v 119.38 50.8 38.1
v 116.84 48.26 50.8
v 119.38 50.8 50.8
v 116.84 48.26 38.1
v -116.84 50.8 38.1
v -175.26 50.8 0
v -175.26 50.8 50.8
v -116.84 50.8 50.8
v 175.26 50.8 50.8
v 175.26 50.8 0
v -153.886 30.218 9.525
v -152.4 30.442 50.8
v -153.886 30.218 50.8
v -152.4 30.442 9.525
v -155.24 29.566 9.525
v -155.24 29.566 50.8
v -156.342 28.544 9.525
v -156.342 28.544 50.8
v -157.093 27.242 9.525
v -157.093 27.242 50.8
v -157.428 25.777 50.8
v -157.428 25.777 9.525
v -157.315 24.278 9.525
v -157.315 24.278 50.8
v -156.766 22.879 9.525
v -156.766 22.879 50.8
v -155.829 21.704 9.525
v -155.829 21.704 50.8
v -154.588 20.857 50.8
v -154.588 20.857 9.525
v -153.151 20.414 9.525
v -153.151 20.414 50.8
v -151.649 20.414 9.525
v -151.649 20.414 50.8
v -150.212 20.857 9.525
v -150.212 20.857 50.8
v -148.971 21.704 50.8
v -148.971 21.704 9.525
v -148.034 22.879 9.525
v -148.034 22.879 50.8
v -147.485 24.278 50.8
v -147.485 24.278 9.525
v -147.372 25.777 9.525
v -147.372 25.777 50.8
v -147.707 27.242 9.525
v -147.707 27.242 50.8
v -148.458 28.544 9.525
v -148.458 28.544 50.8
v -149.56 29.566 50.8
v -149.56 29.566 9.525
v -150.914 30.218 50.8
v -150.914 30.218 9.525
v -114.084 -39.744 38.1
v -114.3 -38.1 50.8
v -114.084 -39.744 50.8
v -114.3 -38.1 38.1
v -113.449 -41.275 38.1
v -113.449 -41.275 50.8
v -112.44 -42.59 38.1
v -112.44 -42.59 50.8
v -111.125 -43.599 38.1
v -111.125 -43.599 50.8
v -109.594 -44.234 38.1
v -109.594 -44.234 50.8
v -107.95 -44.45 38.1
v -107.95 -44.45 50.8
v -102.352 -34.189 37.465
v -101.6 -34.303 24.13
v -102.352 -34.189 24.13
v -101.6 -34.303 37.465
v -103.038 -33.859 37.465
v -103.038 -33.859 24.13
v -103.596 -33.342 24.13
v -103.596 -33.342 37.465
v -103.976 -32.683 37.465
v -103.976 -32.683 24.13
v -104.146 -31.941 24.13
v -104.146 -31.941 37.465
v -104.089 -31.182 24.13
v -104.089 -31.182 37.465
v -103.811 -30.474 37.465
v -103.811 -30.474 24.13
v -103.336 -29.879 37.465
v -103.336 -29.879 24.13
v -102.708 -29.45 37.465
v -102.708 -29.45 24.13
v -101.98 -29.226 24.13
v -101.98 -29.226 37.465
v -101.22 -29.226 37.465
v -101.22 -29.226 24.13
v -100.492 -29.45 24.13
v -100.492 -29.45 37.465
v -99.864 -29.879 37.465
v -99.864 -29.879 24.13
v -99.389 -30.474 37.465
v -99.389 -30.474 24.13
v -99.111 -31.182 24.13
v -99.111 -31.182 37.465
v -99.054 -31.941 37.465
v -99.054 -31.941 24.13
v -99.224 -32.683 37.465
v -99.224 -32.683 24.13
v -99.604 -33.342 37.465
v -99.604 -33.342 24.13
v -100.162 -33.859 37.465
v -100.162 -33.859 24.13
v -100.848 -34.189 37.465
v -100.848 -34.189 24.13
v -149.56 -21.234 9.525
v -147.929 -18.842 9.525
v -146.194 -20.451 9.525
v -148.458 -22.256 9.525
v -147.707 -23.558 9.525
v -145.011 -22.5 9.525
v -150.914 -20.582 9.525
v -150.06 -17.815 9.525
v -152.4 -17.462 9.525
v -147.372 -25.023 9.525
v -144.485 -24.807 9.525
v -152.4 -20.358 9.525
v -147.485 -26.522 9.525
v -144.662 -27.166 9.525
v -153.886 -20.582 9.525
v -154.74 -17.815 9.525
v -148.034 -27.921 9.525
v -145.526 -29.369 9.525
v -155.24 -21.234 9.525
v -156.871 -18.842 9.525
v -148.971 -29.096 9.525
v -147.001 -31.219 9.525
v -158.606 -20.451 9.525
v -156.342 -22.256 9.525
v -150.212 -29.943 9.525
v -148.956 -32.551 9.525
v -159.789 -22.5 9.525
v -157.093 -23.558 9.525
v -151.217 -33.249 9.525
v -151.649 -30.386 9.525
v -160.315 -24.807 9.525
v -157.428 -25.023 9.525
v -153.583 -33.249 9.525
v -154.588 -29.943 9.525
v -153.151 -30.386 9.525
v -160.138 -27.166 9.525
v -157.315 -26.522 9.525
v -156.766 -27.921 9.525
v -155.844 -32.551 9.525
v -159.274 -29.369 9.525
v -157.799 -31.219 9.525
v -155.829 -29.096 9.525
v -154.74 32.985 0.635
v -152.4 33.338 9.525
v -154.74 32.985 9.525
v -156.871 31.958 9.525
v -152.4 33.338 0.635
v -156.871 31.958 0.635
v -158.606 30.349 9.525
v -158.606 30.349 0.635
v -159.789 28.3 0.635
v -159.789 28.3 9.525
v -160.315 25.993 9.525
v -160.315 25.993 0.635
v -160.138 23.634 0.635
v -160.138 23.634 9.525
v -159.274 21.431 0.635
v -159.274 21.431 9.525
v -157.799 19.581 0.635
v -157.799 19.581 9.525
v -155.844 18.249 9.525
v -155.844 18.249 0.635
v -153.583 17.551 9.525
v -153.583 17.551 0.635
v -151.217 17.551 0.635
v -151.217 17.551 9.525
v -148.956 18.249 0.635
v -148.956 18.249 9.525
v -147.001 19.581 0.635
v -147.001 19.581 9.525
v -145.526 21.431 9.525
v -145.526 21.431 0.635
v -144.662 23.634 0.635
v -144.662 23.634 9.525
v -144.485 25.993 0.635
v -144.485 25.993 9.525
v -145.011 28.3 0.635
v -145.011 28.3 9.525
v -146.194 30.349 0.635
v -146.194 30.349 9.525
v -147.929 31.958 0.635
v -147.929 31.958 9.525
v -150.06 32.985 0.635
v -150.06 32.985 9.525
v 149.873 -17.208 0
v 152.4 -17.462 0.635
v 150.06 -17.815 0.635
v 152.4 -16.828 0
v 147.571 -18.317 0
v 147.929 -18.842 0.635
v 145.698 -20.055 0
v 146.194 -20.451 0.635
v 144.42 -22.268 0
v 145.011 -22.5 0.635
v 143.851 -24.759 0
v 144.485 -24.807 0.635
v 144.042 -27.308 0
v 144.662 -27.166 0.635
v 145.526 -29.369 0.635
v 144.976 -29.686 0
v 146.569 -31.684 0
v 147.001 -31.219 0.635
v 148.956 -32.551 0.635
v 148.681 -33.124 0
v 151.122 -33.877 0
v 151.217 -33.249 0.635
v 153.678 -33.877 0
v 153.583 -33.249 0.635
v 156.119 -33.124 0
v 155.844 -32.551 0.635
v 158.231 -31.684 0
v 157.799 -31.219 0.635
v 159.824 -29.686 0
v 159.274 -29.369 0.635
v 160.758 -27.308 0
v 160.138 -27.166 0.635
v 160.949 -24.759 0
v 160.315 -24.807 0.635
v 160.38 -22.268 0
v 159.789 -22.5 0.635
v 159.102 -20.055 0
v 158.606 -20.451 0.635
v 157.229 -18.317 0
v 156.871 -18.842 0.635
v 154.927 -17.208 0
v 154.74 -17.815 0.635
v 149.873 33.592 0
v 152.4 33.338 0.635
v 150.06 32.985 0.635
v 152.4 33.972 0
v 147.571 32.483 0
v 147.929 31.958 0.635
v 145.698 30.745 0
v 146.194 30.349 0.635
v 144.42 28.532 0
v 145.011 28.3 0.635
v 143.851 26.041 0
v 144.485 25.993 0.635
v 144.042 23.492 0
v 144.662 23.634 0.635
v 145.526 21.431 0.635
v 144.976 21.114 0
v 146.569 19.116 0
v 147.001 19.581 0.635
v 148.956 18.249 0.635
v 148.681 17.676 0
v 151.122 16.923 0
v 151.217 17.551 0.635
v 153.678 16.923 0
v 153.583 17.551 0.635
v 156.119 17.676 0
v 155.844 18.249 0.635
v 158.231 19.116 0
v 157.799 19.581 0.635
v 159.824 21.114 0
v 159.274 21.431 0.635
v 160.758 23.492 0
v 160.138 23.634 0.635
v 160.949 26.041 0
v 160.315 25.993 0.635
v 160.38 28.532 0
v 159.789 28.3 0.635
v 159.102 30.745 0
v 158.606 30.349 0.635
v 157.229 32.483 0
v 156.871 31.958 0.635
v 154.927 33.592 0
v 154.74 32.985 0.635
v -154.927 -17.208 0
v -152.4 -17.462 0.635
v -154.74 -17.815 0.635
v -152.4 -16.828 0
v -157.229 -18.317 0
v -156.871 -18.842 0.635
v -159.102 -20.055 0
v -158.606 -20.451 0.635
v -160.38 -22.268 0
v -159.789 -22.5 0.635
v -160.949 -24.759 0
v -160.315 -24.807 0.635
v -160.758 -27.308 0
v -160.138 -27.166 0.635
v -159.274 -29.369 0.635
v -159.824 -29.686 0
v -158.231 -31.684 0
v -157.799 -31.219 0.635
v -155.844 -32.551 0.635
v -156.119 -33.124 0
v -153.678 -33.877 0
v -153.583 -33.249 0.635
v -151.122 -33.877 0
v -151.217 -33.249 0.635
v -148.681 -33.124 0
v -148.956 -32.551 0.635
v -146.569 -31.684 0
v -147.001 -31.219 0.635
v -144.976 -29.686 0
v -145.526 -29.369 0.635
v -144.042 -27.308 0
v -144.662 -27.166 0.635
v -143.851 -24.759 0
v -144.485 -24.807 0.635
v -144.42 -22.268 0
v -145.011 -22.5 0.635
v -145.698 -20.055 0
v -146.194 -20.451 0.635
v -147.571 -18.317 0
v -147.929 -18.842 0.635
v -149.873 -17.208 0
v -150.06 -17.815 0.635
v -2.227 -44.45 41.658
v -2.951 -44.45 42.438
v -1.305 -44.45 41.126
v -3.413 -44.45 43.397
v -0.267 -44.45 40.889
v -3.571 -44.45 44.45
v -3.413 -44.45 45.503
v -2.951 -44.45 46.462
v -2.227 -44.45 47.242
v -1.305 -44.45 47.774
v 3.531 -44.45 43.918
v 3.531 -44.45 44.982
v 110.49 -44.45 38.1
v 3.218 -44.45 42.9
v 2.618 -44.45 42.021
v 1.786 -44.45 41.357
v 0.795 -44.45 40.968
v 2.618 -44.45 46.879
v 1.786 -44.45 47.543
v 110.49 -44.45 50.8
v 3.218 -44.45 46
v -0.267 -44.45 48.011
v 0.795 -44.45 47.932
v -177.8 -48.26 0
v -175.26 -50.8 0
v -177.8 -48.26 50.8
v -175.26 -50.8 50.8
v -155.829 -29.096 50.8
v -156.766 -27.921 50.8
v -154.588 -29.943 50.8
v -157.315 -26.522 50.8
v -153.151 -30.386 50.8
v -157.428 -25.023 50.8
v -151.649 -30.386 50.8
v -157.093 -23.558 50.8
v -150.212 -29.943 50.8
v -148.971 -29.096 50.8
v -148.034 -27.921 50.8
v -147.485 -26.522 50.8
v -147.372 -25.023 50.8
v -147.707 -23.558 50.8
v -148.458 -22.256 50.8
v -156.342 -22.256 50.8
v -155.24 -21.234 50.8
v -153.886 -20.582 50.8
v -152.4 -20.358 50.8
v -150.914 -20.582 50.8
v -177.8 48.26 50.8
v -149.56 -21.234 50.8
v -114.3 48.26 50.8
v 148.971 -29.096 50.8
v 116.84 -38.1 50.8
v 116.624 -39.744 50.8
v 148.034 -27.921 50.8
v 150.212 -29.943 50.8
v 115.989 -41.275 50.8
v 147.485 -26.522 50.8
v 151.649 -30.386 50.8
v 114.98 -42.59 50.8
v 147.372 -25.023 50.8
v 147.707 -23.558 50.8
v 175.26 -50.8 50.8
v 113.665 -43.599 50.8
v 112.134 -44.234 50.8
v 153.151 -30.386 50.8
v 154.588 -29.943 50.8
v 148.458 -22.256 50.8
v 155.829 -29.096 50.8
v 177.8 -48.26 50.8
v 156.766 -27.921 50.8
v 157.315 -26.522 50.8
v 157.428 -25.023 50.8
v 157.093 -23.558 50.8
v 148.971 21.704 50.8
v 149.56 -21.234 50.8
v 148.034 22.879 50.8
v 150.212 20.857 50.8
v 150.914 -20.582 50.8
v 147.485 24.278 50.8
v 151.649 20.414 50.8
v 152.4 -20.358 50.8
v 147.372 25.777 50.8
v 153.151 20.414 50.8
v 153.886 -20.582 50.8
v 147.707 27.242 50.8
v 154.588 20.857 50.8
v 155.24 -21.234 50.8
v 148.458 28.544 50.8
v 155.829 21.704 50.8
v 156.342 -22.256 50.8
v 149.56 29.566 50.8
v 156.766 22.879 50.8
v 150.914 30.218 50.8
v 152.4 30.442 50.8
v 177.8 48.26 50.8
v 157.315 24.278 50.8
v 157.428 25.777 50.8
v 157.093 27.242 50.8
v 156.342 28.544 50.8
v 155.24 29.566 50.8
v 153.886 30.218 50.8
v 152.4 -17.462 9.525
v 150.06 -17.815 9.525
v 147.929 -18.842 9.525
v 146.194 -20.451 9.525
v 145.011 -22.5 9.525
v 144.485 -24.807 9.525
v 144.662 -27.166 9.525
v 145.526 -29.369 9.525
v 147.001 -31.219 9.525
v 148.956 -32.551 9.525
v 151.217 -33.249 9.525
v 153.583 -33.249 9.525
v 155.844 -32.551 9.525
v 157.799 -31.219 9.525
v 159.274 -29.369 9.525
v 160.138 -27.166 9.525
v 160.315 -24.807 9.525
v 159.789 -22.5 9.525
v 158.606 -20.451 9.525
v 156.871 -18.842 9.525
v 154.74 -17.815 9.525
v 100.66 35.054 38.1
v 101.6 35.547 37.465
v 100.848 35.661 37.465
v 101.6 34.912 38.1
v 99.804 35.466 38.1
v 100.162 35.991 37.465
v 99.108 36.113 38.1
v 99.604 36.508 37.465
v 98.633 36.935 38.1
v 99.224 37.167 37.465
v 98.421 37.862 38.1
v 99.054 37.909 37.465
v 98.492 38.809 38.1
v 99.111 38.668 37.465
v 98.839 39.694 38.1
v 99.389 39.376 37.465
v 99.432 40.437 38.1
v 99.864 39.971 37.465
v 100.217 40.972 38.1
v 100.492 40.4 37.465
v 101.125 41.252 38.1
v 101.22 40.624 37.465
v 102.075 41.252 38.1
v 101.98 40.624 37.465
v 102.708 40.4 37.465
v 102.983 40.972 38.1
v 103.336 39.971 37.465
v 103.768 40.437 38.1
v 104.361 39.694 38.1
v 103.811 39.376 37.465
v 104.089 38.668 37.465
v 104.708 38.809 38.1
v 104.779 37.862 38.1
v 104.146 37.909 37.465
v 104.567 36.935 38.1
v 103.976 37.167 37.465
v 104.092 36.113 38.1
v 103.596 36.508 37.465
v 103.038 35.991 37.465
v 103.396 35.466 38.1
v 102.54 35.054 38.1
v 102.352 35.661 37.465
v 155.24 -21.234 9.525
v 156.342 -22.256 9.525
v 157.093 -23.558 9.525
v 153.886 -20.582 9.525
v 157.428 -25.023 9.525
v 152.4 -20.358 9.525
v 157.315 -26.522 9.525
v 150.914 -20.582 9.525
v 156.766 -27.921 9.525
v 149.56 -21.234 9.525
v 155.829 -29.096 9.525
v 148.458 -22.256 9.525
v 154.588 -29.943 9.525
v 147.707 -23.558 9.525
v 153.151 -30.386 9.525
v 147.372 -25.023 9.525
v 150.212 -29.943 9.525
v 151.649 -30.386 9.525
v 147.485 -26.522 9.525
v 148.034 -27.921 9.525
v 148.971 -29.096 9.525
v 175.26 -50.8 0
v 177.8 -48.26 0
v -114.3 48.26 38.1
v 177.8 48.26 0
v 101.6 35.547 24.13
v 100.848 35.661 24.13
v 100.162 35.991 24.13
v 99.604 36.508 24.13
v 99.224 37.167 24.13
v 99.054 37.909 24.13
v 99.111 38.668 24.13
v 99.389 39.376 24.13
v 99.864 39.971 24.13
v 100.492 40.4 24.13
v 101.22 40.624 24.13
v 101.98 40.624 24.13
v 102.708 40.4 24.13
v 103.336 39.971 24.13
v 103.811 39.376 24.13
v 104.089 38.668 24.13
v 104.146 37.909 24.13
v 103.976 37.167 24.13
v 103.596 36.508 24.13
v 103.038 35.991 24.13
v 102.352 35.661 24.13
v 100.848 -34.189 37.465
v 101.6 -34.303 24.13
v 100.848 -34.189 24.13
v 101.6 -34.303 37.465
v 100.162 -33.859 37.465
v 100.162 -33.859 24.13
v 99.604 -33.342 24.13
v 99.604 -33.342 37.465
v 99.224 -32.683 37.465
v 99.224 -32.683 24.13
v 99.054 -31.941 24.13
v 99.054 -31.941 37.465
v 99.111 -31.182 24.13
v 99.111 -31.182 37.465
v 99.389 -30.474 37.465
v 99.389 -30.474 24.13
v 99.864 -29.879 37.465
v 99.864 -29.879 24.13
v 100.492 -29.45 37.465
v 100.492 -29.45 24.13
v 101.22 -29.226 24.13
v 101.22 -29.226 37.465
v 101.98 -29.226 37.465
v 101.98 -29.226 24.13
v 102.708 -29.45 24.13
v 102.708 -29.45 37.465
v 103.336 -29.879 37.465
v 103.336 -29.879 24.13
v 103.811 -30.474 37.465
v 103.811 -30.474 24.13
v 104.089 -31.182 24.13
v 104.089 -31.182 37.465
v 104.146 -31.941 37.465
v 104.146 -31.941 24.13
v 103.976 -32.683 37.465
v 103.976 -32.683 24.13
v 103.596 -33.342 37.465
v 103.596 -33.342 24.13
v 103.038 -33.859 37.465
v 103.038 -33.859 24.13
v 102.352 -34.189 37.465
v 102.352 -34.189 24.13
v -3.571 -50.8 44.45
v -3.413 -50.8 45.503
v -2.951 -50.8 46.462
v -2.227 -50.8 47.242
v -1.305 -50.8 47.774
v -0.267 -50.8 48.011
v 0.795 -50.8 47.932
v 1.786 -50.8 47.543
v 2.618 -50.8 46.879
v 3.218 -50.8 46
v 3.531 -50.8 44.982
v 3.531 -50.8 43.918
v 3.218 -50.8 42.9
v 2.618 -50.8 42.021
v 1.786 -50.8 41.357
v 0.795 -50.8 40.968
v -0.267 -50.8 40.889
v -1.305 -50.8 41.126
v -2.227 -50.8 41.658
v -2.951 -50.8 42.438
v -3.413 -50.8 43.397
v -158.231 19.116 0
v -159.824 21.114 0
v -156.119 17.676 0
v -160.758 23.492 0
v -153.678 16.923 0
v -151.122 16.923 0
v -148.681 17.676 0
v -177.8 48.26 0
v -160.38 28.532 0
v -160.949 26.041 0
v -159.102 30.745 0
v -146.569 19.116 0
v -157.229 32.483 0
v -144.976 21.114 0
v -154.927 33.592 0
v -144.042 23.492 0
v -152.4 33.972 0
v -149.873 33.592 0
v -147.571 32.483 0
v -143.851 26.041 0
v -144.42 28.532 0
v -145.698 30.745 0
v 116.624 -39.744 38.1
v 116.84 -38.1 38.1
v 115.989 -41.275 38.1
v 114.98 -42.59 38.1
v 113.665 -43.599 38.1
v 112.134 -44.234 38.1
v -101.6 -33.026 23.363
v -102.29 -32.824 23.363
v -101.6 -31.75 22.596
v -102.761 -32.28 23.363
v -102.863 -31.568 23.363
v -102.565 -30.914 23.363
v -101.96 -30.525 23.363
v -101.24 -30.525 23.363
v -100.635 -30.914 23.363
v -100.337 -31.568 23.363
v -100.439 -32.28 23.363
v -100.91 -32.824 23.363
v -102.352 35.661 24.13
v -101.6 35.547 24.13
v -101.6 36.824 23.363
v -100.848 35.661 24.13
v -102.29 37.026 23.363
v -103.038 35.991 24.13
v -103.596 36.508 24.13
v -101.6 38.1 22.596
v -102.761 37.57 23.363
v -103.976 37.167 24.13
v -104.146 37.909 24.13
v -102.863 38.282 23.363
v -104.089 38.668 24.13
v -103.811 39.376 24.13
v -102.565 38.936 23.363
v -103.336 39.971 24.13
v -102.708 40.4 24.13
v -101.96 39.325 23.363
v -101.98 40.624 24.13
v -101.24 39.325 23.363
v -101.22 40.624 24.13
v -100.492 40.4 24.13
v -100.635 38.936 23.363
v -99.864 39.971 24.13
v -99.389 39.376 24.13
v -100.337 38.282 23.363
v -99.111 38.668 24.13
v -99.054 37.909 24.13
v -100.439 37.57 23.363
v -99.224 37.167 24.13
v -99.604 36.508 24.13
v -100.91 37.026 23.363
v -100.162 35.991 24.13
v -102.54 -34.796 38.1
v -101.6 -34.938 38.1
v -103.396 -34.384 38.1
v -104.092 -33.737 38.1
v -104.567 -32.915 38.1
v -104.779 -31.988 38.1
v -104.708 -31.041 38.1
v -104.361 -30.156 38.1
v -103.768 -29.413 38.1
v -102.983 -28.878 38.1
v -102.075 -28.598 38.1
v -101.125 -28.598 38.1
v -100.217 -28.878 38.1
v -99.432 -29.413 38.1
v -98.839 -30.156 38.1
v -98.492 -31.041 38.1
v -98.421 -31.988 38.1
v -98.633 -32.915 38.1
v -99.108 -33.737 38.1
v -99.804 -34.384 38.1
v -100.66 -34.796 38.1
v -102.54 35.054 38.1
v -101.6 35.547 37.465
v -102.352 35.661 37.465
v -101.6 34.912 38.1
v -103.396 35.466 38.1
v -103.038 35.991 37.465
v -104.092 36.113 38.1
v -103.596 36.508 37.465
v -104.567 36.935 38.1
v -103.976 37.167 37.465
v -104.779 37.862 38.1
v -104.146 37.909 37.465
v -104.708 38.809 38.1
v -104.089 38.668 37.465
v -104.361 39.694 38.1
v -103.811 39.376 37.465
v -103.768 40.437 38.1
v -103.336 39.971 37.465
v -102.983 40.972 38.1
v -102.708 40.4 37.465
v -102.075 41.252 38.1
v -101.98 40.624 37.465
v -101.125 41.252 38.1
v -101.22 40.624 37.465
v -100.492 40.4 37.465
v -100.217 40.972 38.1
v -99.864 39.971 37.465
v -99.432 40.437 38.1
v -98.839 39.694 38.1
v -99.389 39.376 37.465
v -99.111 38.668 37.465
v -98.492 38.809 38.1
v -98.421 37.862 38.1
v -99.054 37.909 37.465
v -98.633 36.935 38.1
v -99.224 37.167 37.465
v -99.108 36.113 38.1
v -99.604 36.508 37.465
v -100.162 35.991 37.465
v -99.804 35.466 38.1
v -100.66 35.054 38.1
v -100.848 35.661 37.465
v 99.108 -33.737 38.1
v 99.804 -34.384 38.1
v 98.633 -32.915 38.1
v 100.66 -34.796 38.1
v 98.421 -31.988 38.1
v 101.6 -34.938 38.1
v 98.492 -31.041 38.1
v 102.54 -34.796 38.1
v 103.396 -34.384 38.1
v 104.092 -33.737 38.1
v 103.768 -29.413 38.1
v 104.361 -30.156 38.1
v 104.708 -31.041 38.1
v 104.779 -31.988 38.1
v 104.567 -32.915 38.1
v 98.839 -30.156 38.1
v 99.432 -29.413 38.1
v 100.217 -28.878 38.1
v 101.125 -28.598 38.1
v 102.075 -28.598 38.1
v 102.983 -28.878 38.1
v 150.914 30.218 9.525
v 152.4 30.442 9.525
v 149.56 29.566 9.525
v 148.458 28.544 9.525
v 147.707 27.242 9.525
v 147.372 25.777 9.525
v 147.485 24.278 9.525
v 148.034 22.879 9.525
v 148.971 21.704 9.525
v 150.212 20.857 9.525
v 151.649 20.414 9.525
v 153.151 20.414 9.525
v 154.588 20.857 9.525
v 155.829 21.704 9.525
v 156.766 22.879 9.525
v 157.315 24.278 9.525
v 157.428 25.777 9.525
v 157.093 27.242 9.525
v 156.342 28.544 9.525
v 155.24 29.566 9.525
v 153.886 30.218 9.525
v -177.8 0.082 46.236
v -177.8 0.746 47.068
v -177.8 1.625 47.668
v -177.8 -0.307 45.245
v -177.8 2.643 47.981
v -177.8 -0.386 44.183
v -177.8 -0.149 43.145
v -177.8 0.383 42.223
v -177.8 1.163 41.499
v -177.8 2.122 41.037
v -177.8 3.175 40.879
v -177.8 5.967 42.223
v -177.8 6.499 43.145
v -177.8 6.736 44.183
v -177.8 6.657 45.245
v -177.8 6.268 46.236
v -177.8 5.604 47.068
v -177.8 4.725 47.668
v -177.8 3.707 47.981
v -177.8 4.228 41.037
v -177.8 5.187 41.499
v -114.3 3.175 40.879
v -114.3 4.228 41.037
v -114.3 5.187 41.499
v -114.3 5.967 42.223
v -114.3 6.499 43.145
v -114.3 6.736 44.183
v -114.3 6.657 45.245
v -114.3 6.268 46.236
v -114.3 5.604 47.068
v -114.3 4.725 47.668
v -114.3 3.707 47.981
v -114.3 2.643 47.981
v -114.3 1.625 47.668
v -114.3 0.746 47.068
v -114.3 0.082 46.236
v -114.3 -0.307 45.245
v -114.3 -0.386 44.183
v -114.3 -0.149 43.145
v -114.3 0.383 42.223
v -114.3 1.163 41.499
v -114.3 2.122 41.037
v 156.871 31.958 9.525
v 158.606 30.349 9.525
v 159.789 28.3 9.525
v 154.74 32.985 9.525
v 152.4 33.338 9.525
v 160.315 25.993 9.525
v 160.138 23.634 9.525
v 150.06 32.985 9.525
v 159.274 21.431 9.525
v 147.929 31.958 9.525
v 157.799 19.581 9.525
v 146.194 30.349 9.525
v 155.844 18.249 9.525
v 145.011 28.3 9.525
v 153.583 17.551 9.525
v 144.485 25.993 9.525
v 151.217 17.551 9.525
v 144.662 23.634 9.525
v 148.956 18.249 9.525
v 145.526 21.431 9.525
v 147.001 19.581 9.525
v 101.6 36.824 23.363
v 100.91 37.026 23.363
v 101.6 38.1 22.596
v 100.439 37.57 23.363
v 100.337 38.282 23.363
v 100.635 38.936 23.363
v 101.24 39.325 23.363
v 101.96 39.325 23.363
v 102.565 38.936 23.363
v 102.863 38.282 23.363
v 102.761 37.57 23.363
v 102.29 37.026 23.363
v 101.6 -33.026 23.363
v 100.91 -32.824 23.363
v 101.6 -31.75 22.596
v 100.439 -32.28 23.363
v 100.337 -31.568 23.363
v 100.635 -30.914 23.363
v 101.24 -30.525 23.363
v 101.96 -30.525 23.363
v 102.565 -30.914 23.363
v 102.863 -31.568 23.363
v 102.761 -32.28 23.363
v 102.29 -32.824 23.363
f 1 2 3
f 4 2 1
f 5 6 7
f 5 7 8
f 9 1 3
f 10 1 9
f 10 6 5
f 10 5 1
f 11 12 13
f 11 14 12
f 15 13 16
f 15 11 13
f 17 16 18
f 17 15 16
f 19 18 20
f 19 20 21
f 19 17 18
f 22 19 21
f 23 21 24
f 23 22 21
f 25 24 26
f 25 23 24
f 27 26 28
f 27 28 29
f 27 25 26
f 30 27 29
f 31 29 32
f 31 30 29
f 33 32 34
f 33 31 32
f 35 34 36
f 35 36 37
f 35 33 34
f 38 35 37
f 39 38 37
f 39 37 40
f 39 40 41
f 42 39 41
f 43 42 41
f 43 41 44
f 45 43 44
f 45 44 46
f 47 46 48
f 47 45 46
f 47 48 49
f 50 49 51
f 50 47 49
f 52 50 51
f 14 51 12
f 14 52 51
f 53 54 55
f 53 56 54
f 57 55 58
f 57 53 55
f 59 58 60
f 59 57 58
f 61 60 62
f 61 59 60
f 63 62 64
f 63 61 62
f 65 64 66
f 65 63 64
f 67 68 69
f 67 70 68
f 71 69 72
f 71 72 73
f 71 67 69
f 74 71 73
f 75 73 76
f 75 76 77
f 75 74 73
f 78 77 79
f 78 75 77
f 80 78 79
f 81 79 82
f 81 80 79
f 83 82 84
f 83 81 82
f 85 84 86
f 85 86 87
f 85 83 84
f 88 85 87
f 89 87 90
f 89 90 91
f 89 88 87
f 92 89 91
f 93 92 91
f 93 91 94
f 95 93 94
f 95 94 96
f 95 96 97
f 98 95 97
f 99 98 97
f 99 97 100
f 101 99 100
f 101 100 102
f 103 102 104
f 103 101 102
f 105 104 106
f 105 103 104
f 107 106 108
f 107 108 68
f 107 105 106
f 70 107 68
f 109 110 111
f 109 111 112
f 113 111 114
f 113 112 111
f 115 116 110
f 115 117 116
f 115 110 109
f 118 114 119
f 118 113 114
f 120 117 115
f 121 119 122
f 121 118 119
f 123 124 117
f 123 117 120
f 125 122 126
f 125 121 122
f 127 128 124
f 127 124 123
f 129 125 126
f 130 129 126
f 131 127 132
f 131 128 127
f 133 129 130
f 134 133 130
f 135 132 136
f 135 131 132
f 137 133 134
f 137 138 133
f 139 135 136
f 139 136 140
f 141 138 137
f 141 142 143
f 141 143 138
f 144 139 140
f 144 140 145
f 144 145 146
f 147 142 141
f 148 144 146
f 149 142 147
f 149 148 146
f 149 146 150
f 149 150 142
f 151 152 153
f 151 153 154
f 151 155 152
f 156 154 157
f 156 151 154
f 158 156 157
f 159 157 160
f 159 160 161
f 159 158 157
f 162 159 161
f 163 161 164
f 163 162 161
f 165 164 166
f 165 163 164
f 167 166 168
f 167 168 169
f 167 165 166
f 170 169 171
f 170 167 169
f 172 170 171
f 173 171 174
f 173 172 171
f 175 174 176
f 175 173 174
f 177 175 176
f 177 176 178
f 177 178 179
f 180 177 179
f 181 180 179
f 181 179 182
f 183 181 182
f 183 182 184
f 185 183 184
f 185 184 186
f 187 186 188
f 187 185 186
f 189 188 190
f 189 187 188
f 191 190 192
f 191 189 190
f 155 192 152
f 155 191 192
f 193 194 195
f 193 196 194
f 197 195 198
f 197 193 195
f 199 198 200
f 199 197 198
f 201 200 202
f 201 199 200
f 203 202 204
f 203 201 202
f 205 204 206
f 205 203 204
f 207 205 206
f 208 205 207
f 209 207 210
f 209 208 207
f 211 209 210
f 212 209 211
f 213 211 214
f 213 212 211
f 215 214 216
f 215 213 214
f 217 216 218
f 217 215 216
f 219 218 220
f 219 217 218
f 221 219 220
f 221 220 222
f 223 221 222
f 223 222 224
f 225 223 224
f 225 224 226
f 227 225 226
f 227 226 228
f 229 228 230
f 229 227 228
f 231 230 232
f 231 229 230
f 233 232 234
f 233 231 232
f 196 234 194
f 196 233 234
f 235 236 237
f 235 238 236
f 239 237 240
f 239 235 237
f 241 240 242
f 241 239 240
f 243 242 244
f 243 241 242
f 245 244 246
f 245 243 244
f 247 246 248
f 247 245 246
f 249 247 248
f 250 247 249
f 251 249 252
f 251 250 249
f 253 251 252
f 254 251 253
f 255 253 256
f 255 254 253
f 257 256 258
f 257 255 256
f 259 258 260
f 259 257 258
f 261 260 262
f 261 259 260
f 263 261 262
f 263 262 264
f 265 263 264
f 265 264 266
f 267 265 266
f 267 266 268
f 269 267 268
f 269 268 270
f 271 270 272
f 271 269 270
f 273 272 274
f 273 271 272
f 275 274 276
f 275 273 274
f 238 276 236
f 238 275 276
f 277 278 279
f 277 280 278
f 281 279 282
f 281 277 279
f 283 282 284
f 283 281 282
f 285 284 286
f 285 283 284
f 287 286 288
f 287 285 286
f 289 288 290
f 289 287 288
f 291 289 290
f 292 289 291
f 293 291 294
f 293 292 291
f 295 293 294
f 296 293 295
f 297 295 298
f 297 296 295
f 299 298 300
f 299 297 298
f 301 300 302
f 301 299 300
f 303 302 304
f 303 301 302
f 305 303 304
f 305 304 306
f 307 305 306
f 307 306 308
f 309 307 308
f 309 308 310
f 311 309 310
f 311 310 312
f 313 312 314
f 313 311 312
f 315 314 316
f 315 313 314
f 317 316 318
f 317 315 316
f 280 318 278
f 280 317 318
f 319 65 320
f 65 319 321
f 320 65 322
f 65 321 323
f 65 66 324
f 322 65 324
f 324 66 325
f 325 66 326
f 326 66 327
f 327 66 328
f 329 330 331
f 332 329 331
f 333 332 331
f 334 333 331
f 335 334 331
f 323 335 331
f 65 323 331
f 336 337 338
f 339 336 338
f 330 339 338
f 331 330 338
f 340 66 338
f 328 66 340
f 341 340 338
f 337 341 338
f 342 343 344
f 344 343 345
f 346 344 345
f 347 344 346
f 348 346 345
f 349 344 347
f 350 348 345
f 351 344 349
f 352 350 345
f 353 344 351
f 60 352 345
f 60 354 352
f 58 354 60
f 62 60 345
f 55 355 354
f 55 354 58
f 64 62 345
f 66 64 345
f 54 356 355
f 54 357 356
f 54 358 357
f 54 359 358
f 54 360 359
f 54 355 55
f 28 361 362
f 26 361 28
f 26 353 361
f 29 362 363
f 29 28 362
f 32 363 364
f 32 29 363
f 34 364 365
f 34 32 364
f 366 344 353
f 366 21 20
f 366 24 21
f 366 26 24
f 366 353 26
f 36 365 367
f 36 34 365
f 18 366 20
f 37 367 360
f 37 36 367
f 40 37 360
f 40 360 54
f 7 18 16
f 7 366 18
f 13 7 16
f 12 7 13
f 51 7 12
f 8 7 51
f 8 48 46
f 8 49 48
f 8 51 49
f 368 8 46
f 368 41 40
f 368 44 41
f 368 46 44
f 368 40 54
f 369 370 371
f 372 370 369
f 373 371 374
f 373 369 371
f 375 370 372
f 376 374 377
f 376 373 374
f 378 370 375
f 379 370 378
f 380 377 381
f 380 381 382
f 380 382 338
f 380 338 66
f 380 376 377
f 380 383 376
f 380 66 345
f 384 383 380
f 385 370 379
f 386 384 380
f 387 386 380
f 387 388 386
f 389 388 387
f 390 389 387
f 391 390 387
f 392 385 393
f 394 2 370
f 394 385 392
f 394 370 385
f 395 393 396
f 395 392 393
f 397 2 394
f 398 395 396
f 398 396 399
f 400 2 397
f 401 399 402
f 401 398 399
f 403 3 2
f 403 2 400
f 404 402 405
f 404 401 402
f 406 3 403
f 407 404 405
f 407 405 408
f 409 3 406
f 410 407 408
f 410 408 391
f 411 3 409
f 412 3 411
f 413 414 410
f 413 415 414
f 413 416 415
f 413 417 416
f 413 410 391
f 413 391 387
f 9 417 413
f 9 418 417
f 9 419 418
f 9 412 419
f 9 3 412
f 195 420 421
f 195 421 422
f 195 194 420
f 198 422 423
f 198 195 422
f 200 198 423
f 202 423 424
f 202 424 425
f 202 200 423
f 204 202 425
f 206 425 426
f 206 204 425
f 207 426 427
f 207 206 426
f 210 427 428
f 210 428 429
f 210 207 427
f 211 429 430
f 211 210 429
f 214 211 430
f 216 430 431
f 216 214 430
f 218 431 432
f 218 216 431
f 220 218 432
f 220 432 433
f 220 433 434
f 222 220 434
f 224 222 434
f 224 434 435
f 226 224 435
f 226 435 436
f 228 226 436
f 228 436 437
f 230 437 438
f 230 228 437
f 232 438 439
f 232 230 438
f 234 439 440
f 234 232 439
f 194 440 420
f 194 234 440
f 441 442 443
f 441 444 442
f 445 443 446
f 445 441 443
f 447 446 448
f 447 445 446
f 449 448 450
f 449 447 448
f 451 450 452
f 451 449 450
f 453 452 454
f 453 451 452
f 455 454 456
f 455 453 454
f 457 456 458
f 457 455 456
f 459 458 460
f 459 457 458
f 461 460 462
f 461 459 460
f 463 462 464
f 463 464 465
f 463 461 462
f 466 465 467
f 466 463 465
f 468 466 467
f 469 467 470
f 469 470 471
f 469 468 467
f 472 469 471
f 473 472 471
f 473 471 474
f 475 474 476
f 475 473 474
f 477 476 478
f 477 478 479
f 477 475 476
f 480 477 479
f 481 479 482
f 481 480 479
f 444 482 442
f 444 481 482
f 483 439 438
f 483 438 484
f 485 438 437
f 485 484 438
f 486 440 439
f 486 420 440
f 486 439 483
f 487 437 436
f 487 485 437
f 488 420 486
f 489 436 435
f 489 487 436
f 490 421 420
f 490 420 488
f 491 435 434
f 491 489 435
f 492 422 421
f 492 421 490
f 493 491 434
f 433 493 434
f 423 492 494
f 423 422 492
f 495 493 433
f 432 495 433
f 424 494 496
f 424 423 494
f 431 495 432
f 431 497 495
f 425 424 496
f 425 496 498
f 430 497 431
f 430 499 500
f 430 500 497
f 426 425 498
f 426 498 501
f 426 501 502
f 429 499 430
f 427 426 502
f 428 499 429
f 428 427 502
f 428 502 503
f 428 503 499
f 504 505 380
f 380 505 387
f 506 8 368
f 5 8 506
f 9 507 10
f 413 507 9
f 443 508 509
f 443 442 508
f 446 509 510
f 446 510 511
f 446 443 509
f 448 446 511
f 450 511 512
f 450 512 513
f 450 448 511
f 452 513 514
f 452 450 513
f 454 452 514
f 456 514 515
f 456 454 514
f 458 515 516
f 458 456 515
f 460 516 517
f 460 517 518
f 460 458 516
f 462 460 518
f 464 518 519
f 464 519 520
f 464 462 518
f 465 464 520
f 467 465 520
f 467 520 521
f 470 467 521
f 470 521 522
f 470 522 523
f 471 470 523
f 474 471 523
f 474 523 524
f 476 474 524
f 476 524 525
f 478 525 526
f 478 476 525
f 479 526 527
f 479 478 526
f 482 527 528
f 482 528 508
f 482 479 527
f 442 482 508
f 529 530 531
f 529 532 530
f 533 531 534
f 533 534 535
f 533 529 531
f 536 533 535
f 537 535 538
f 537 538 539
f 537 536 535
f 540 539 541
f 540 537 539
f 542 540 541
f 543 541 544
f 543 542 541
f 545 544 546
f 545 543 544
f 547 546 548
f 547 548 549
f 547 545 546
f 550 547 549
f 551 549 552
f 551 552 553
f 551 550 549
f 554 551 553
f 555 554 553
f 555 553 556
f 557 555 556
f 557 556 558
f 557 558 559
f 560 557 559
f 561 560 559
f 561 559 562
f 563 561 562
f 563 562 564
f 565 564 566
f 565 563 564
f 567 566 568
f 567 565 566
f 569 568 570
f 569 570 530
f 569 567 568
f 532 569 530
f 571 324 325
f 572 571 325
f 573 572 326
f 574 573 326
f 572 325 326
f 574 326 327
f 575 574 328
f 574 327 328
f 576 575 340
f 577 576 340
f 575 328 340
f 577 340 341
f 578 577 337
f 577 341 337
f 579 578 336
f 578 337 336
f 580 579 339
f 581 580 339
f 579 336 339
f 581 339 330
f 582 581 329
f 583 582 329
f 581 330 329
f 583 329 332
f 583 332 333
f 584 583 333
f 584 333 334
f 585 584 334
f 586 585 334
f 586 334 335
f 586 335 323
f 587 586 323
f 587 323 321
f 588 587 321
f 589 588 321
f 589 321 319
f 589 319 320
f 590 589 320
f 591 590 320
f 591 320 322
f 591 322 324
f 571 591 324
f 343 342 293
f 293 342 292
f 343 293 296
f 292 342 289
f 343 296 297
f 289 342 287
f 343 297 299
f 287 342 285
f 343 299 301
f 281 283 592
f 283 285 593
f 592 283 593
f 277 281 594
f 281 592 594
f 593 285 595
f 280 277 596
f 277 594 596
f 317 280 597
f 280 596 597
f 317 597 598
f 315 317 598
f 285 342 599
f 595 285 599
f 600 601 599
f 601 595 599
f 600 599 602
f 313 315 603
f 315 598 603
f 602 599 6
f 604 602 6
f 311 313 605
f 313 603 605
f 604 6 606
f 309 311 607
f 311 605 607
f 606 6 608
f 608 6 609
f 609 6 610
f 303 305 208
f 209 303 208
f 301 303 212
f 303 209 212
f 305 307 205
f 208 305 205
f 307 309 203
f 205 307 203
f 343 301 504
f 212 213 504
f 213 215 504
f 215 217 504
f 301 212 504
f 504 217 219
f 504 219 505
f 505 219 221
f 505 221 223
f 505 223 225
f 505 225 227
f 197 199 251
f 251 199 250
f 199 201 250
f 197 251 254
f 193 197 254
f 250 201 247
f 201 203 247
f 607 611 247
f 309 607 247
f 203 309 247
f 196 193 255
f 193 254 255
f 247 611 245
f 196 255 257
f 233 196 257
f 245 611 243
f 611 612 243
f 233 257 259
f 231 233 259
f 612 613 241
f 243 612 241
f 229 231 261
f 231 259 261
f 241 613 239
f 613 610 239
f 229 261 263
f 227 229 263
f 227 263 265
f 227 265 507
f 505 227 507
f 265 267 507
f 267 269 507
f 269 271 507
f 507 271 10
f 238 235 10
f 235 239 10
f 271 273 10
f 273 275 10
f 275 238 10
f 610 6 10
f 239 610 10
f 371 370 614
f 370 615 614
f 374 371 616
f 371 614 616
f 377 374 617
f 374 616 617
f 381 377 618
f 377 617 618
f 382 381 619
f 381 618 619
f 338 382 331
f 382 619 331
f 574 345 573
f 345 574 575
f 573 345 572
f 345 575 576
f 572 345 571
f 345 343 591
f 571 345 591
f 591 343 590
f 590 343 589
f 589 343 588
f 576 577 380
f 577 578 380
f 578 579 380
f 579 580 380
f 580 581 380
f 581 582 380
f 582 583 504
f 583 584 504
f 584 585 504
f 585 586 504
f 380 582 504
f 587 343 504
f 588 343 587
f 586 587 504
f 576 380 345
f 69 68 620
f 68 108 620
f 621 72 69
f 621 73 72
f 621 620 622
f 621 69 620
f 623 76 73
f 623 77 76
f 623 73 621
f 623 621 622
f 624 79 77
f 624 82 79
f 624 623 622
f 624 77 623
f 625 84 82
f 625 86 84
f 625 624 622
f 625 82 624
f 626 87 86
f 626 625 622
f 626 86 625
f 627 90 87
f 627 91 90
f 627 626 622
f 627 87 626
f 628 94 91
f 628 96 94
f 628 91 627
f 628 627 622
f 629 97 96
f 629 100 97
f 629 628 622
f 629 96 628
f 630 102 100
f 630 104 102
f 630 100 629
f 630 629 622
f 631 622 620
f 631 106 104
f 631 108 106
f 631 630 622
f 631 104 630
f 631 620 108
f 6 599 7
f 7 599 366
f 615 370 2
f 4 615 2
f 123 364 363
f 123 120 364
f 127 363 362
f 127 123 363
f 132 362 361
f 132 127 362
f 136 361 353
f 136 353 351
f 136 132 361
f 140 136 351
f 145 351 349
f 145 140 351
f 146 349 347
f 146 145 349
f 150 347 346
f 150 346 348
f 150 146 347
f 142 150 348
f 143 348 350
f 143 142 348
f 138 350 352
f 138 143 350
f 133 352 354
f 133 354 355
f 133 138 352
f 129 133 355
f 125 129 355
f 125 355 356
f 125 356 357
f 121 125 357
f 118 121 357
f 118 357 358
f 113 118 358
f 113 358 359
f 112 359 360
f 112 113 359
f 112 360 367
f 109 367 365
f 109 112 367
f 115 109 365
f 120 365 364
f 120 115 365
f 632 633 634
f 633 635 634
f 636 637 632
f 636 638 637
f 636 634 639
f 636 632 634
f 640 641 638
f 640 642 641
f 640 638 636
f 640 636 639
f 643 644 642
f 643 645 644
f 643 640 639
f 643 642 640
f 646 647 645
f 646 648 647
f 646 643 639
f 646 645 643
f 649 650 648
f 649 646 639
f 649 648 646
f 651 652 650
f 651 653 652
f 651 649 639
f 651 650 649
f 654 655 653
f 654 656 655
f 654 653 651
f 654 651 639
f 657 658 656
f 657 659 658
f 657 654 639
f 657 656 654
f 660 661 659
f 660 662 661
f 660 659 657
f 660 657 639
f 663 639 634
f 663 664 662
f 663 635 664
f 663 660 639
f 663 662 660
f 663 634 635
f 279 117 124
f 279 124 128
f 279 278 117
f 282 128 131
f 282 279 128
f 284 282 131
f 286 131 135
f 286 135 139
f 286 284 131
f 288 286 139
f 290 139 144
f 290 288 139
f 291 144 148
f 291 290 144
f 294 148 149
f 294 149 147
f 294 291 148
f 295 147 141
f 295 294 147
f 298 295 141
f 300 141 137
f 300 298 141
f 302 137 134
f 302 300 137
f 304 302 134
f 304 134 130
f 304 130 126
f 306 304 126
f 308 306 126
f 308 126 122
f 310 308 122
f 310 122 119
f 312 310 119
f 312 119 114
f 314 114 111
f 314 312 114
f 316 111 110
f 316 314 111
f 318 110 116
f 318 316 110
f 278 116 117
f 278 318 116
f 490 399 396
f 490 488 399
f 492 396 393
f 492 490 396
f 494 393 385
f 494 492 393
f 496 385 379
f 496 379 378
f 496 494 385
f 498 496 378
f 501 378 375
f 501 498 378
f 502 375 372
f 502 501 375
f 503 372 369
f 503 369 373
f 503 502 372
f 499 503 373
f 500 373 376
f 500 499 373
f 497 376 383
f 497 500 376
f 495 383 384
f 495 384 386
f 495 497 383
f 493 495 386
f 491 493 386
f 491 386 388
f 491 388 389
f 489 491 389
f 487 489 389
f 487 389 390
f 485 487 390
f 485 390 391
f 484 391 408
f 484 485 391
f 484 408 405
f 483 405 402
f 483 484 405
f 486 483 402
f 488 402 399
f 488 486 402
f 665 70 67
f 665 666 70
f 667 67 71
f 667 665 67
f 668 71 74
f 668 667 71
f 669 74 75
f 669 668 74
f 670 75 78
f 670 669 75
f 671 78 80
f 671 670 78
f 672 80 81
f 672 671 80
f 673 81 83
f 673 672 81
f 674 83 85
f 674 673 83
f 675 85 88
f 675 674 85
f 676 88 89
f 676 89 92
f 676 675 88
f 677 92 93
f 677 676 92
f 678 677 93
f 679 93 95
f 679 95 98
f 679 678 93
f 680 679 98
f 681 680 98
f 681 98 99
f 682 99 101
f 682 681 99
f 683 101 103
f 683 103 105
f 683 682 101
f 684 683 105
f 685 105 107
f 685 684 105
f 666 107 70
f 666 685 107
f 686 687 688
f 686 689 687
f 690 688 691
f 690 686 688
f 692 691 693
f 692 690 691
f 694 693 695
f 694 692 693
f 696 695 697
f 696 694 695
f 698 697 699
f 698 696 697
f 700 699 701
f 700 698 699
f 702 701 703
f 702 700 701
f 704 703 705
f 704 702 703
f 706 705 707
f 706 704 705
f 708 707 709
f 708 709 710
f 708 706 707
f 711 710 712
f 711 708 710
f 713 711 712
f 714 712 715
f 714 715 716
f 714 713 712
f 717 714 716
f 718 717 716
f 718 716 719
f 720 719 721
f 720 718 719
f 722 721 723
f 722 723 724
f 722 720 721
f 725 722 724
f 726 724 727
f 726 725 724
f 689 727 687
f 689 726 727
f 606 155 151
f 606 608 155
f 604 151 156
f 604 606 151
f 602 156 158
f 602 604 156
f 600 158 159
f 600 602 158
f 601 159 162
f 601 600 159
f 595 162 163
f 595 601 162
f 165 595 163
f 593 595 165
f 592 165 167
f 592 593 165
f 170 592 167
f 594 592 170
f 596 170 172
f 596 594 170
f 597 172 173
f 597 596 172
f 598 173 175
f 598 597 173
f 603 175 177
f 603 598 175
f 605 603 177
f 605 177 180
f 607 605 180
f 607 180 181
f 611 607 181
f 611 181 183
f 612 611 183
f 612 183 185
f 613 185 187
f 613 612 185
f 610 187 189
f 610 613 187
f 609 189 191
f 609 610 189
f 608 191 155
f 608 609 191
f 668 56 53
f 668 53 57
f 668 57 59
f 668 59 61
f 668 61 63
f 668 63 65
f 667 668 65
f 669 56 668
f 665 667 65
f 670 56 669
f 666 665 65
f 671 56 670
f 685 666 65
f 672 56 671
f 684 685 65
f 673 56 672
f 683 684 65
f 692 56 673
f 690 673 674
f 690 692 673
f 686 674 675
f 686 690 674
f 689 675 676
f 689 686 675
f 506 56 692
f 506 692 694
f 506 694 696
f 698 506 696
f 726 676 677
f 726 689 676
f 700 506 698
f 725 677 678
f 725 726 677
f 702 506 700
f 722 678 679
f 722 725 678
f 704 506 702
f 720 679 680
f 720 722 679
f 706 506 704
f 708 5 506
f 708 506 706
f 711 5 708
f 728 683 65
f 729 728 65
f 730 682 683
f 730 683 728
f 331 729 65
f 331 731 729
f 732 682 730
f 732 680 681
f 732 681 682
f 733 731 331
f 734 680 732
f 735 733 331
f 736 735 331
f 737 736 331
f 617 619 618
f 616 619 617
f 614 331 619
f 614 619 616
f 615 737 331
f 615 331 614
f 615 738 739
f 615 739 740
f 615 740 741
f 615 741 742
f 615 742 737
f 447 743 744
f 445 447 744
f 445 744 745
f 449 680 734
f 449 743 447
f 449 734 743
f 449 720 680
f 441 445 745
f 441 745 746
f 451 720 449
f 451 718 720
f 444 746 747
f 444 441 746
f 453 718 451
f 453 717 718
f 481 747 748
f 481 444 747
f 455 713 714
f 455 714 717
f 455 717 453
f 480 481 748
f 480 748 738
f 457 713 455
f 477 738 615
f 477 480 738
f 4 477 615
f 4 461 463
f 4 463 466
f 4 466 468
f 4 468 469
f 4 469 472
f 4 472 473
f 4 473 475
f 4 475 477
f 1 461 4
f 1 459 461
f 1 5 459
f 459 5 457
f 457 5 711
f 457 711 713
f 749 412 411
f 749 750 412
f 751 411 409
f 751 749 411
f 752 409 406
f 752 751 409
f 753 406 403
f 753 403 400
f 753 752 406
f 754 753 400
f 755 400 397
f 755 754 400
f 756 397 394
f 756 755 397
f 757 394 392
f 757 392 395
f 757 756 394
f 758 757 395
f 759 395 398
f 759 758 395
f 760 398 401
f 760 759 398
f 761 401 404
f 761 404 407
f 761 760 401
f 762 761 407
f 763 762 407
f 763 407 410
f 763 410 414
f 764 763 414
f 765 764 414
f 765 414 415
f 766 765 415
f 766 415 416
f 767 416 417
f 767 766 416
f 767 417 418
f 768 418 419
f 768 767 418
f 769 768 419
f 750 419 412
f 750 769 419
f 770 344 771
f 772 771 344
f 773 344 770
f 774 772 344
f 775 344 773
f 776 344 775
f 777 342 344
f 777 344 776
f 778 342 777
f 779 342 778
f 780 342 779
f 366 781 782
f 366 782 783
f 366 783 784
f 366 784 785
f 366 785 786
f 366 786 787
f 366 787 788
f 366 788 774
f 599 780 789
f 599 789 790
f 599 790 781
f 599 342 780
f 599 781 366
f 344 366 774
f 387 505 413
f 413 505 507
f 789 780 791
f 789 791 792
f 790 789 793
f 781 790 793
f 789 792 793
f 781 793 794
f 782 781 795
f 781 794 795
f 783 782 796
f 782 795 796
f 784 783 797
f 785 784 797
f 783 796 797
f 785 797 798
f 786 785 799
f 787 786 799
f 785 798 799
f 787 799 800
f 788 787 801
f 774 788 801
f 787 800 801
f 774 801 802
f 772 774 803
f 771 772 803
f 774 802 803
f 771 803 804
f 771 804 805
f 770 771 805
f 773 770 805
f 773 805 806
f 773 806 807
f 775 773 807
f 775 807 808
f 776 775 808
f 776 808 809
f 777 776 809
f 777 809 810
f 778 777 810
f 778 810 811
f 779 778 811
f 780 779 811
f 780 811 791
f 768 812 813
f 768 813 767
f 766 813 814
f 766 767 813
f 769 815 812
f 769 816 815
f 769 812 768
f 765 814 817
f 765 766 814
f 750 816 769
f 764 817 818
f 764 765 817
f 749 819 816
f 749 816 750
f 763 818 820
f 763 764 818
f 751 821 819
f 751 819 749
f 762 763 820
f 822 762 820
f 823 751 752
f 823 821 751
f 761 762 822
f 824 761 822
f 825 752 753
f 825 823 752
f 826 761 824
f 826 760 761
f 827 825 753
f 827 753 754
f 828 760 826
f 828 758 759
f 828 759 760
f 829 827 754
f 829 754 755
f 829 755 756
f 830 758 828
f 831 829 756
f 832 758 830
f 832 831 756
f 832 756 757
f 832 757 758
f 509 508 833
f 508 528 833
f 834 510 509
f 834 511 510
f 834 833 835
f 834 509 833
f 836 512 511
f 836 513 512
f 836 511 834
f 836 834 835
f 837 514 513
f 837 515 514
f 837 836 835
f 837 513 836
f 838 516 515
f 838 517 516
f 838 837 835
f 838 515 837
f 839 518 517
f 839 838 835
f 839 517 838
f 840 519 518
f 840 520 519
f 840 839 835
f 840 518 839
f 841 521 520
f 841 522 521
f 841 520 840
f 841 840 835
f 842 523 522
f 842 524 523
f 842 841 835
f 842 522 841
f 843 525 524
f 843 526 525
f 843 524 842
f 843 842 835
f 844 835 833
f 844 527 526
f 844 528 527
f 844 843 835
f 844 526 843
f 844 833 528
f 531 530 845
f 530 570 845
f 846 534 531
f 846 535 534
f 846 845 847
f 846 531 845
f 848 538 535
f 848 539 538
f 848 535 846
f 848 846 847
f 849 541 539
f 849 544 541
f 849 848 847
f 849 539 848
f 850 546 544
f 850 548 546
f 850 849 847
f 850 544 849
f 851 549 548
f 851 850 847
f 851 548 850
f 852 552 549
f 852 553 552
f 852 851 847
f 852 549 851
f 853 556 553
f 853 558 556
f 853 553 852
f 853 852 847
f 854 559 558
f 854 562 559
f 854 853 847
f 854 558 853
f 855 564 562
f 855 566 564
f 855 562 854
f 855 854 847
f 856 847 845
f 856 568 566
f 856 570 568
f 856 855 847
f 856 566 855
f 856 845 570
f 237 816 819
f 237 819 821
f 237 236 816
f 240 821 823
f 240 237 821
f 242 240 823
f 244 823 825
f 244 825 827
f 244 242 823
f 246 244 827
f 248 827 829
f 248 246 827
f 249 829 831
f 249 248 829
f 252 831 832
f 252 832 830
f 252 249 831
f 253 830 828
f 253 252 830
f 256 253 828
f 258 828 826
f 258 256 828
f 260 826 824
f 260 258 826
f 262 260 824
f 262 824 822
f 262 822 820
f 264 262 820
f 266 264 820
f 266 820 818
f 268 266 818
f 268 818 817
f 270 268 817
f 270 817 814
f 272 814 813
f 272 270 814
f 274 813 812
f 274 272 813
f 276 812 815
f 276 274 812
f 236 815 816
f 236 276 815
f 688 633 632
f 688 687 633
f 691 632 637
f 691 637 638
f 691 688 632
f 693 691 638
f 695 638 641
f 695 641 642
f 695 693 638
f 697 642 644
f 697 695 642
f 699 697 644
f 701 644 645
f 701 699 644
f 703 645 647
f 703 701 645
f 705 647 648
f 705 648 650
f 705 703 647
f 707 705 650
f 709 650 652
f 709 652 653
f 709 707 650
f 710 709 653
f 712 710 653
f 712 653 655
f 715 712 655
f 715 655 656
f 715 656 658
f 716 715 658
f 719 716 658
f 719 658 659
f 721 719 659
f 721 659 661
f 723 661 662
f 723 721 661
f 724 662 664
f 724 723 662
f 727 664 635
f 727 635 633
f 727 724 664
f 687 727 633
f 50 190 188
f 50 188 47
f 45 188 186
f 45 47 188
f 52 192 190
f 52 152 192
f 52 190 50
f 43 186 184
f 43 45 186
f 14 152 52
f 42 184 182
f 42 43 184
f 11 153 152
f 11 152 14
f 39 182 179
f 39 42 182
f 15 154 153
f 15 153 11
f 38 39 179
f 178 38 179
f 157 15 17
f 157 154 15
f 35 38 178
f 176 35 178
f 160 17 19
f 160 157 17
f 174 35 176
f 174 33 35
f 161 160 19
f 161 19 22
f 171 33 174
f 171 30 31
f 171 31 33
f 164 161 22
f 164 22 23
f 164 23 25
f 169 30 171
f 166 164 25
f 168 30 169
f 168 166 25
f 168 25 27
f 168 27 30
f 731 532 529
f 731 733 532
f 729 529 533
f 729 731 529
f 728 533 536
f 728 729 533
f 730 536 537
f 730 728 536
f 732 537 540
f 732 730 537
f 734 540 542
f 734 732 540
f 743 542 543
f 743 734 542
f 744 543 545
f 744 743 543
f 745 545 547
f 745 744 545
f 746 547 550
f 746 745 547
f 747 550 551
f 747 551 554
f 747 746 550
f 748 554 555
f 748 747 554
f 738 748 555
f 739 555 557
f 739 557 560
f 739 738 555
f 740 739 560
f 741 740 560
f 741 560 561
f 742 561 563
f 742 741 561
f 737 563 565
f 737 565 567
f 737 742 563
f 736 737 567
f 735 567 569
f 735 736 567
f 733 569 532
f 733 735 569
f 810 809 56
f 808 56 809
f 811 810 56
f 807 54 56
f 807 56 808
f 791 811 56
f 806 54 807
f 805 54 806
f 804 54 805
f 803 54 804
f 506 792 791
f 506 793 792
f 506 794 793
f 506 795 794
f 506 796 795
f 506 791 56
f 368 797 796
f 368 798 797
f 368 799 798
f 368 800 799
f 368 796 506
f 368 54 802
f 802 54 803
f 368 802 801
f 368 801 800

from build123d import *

# Parameters (mm, degrees)
SKETCH1_W                   = 355.6
SKETCH1_H                   = 101.6
EXTRUDE1_DEPTH              = 50.8
SKETCH6_W                   = 231.14
SKETCH6_H                   = 95.25
EXTRUDE2_DEPTH              = 12.7
FILLET1_R                   = 6.35
LPATTERN3_COUNT             = 2
LPATTERN3_PITCH             = 203.2
LPATTERN3_COUNT_DIR2        = 2
LPATTERN3_PITCH_DIR2        = 69.85
F_1_4_CLEARANCE_HOLE2_D     = 7.14248
F_1_4_CLEARANCE_HOLE2_DEPTH = 63.5
F_1_4_CLEARANCE_HOLE1_D     = 7.14248
LPATTERN4_COUNT             = 2
LPATTERN4_PITCH             = 50.8
LPATTERN4_COUNT_DIR2        = 2
LPATTERN4_PITCH_DIR2        = 304.8
CHAMFER1_SIZE               = 2.54


with BuildPart() as part:
    # Sketch1 → Extrude1 (new body)
    with BuildSketch(Plane.XY):
        Rectangle(SKETCH1_W, SKETCH1_H)
    extrude(amount=EXTRUDE1_DEPTH)

    # Sketch6 → Extrude2 (cut)
    with BuildSketch(Plane.XY.offset(50.8)):
        with Locations((1.27, 3.175)):
            Rectangle(SKETCH6_W, SKETCH6_H)
    extrude(amount=-EXTRUDE2_DEPTH, mode=Mode.SUBTRACT)

    # Fillet1
    fillet1_edges = [part.edges().sort_by_distance(p)[0] for p in [
        (116.84, -44.45, 44.45),
        (-114.3, -44.45, 44.45),
    ]]
    fillet(fillet1_edges, radius=FILLET1_R)

    # Sketch7 → 1/4-20 Tapped Hole1 (revolve, cut)
    with BuildSketch(Plane(origin=(101.6, -31.75, 38.1), x_dir=(0, -1, 0), z_dir=(1, 0, 0))):
        Polygon((0, 0), (0, 15.503816902), (2.5527, 13.97), (2.5527, 0.635), (3.1877, 0), align=None)
    f_1_4_20_tapped_hole1 = revolve(axis=Axis((101.6, -31.75, 44.45), (0, 0, -1)), mode=Mode.SUBTRACT)

    # LPattern3: 1_4-20 Tapped Hole1 2 × 2
    with Locations(*[(-i * LPATTERN3_PITCH, j * LPATTERN3_PITCH_DIR2, 0) for i in range(LPATTERN3_COUNT) for j in range(LPATTERN3_COUNT_DIR2) if (i, j) != (0, 0)]):
        add(f_1_4_20_tapped_hole1, mode=Mode.SUBTRACT)

    # 1/4 Clearance Hole2
    with Locations(Plane.ZY.offset(177.8)):
        with Locations((44.45, 3.175)):
            Hole(F_1_4_CLEARANCE_HOLE2_D / 2, depth=F_1_4_CLEARANCE_HOLE2_DEPTH)

    # 1/4 Clearance Hole1 (through all)
    with Locations(Plane.XZ.offset(50.8)):
        with Locations((0, 44.45)):
            Hole(F_1_4_CLEARANCE_HOLE1_D / 2)

    # Sketch14 → CBORE for 3/8 Socket Head Cap Screw1 (revolve, cut)
    with BuildSketch(Plane(origin=(152.4, 25.4, 0), x_dir=(0, 1, 0), z_dir=(1, 0, 0))):
        Polygon((0, 0), (0, 50.8), (5.0419, 50.8), (5.0419, 9.525), (7.9375, 9.525), (7.9375, 0.635), (8.5725, 0), align=None)
    cbore_for_3_8_socket_head_cap_screw1 = revolve(axis=Axis((152.4, 25.4, -6.35), (0, 0, 1)), mode=Mode.SUBTRACT)

    # LPattern4: CBORE for 3_8 Socket Head Cap Screw1 2 × 2
    with Locations(*[(-j * LPATTERN4_PITCH_DIR2, -i * LPATTERN4_PITCH, 0) for i in range(LPATTERN4_COUNT) for j in range(LPATTERN4_COUNT_DIR2) if (i, j) != (0, 0)]):
        add(cbore_for_3_8_socket_head_cap_screw1, mode=Mode.SUBTRACT)

    # Chamfer1
    chamfer1_edges = [part.edges().sort_by_distance(p)[0] for p in [
        (116.84, 50.8, 44.45),
        (-114.3, 50.8, 44.45),
        (177.8, -50.8, 25.4),
        (-177.8, -50.8, 25.4),
        (-177.8, 50.8, 25.4),
        (177.8, 50.8, 25.4),
    ]]
    chamfer(chamfer1_edges, length=CHAMFER1_SIZE)


solid = part.part
